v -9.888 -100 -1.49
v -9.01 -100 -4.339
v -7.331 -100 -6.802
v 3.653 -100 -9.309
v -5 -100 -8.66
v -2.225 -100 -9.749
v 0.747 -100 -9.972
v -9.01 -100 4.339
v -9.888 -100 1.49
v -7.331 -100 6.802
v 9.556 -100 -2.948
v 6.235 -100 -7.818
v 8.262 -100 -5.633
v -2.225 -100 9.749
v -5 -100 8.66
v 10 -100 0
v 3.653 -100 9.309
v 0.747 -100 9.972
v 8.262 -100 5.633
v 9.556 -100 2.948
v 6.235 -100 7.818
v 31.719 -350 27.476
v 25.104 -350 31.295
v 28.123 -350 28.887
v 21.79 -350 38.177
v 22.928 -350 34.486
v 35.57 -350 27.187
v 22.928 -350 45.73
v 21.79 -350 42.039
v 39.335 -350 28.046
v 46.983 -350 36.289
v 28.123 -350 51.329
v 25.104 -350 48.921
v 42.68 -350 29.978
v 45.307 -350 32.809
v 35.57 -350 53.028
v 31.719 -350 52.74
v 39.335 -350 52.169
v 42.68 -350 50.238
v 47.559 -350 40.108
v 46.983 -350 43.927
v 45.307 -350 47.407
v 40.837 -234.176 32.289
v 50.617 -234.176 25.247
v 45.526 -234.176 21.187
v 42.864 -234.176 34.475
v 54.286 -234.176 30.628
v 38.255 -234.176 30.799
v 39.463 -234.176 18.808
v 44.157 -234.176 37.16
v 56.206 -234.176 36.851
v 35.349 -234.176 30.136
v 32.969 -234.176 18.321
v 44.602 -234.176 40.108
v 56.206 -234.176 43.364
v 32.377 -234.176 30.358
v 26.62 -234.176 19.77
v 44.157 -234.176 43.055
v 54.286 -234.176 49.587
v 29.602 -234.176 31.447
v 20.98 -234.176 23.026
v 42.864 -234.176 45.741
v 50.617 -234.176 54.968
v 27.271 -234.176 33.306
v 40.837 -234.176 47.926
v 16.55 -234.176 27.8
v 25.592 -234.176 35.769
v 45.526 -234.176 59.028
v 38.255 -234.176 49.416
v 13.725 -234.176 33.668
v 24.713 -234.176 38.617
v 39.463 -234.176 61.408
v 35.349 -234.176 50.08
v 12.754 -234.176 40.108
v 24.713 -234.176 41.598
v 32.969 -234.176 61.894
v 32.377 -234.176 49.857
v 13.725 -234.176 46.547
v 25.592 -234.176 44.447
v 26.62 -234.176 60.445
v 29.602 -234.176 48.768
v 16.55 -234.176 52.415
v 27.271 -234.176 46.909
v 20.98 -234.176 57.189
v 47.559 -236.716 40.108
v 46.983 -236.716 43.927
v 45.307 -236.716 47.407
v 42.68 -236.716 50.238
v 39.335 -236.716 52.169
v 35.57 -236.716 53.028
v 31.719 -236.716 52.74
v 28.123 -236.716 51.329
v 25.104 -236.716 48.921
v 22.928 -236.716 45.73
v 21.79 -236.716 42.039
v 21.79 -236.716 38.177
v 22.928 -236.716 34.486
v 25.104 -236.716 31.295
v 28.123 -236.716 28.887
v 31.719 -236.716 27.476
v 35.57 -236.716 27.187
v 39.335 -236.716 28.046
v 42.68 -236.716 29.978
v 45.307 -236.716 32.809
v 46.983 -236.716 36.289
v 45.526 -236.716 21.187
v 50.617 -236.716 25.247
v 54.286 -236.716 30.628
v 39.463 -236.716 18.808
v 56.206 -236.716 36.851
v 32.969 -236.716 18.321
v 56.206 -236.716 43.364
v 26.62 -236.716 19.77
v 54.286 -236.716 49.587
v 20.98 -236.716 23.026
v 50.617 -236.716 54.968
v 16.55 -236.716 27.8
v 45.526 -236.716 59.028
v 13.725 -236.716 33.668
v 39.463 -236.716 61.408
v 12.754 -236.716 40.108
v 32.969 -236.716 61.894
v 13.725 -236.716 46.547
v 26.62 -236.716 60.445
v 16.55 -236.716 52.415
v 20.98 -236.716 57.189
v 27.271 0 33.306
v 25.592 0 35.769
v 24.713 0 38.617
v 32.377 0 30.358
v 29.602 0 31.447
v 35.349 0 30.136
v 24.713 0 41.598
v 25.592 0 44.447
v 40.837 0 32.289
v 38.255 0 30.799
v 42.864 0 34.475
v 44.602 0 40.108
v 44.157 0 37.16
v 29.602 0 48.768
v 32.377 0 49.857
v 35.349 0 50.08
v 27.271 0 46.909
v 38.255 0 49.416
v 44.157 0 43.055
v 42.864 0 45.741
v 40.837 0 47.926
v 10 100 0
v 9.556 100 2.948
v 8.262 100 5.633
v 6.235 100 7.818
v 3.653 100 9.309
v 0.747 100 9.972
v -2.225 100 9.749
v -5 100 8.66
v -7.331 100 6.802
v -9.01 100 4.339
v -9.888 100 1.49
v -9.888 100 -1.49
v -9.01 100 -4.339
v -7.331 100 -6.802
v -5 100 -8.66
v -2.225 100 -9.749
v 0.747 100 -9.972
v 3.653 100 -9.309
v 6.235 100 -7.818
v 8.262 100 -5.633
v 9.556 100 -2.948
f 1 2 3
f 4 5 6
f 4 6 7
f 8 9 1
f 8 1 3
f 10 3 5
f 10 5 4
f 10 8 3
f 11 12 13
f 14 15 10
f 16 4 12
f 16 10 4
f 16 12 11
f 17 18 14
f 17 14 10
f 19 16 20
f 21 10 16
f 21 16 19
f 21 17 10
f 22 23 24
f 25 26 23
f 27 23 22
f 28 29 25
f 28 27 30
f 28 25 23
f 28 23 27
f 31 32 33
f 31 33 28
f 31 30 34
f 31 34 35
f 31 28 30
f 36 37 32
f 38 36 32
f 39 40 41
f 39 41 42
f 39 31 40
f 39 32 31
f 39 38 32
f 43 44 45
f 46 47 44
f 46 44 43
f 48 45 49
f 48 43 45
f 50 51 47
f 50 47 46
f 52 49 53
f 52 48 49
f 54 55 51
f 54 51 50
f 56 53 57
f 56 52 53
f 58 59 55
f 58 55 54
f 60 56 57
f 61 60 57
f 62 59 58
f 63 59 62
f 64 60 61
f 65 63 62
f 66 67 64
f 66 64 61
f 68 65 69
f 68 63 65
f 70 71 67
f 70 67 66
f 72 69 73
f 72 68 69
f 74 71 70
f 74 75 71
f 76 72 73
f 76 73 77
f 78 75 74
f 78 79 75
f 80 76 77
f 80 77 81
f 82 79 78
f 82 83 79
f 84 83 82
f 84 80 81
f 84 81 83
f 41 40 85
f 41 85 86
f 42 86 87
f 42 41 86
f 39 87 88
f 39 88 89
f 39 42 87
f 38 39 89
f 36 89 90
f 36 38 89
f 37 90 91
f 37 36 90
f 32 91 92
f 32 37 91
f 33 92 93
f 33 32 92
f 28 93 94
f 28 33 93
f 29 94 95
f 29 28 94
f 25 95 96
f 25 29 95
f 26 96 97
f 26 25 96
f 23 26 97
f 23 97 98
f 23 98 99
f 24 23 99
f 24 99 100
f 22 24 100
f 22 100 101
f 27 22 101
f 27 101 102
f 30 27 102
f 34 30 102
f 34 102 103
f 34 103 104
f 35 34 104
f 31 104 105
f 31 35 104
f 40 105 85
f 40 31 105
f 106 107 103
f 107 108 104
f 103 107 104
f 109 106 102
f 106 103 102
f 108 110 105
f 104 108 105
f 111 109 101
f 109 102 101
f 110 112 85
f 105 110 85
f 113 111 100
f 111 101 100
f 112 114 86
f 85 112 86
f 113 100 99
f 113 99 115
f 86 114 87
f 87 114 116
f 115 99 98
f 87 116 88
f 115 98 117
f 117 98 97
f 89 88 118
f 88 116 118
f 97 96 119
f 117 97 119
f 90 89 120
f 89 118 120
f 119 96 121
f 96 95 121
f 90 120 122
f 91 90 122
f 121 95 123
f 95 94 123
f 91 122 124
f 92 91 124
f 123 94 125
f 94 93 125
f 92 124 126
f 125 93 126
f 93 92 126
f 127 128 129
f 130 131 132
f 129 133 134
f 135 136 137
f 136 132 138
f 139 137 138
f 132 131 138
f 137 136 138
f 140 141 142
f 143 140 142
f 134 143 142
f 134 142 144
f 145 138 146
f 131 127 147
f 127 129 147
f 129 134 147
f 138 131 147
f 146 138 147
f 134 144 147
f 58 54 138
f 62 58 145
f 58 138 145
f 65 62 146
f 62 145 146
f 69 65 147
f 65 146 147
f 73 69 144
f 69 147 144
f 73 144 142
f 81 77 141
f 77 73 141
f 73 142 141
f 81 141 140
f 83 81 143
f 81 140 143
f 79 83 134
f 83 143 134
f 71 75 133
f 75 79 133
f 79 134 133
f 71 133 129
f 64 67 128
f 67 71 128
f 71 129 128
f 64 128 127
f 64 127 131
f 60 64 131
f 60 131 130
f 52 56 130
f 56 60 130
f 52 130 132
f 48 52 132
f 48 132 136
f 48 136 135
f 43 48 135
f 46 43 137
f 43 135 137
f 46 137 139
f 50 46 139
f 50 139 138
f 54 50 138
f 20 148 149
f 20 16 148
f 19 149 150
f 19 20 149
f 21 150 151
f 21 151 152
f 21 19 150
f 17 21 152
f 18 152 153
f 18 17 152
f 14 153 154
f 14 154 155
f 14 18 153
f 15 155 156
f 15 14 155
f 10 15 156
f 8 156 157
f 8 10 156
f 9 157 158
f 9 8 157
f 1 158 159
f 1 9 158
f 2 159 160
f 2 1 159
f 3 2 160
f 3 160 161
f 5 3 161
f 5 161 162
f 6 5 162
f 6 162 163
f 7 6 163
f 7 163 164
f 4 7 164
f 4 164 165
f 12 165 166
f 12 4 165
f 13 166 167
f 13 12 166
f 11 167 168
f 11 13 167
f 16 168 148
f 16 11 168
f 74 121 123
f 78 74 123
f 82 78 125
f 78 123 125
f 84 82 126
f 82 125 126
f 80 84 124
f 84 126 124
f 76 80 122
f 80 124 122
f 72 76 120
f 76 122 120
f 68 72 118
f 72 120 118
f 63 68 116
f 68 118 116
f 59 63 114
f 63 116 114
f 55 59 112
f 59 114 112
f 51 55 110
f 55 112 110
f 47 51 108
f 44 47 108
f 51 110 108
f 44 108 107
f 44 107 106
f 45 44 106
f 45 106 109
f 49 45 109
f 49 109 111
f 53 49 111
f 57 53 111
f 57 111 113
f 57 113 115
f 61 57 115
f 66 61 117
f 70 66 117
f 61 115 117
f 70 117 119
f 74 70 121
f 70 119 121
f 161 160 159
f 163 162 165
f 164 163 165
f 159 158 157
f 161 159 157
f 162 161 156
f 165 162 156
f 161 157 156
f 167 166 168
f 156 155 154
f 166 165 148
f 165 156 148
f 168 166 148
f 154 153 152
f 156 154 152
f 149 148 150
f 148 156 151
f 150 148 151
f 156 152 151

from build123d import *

# Parameters (mm, degrees)
F0_R     = 10
F1_DEPTH = 100
F2_R     = 10
F3_DEPTH = 350
F4_R     = 12.956907
F5_DEPTH = 113.284
F6_R     = 21.847815
F7_DEPTH = 2.54


with BuildPart() as f1:
    # F0 (on Front) → F1 (new body, symmetric)
    with BuildSketch(Plane.XZ):
        Circle(F0_R)
    extrude(amount=F1_DEPTH, both=True)


with BuildPart() as f3:
    # F2 (on Front) → F3 (new body)
    with BuildSketch(Plane.XZ):
        with Locations((34.601726, 40.107727)):
            Circle(F2_R)
    extrude(amount=F3_DEPTH)

    # F4 (on face) → F5 (join)
    with BuildSketch(Plane.XZ.offset(350)):
        with Locations((34.601726, 40.107727)):
            Circle(F4_R)
    extrude(amount=-F5_DEPTH)

    # F6 (on face) → F7 (join)
    with BuildSketch(Plane(origin=(0, -236.716, 0), x_dir=(-1, 0, 0), z_dir=(0, 1, 0))):
        with Locations((-34.601726, 40.107727)):
            Circle(F6_R)
    extrude(amount=F7_DEPTH)


solid = Compound([f1.part, f3.part])
